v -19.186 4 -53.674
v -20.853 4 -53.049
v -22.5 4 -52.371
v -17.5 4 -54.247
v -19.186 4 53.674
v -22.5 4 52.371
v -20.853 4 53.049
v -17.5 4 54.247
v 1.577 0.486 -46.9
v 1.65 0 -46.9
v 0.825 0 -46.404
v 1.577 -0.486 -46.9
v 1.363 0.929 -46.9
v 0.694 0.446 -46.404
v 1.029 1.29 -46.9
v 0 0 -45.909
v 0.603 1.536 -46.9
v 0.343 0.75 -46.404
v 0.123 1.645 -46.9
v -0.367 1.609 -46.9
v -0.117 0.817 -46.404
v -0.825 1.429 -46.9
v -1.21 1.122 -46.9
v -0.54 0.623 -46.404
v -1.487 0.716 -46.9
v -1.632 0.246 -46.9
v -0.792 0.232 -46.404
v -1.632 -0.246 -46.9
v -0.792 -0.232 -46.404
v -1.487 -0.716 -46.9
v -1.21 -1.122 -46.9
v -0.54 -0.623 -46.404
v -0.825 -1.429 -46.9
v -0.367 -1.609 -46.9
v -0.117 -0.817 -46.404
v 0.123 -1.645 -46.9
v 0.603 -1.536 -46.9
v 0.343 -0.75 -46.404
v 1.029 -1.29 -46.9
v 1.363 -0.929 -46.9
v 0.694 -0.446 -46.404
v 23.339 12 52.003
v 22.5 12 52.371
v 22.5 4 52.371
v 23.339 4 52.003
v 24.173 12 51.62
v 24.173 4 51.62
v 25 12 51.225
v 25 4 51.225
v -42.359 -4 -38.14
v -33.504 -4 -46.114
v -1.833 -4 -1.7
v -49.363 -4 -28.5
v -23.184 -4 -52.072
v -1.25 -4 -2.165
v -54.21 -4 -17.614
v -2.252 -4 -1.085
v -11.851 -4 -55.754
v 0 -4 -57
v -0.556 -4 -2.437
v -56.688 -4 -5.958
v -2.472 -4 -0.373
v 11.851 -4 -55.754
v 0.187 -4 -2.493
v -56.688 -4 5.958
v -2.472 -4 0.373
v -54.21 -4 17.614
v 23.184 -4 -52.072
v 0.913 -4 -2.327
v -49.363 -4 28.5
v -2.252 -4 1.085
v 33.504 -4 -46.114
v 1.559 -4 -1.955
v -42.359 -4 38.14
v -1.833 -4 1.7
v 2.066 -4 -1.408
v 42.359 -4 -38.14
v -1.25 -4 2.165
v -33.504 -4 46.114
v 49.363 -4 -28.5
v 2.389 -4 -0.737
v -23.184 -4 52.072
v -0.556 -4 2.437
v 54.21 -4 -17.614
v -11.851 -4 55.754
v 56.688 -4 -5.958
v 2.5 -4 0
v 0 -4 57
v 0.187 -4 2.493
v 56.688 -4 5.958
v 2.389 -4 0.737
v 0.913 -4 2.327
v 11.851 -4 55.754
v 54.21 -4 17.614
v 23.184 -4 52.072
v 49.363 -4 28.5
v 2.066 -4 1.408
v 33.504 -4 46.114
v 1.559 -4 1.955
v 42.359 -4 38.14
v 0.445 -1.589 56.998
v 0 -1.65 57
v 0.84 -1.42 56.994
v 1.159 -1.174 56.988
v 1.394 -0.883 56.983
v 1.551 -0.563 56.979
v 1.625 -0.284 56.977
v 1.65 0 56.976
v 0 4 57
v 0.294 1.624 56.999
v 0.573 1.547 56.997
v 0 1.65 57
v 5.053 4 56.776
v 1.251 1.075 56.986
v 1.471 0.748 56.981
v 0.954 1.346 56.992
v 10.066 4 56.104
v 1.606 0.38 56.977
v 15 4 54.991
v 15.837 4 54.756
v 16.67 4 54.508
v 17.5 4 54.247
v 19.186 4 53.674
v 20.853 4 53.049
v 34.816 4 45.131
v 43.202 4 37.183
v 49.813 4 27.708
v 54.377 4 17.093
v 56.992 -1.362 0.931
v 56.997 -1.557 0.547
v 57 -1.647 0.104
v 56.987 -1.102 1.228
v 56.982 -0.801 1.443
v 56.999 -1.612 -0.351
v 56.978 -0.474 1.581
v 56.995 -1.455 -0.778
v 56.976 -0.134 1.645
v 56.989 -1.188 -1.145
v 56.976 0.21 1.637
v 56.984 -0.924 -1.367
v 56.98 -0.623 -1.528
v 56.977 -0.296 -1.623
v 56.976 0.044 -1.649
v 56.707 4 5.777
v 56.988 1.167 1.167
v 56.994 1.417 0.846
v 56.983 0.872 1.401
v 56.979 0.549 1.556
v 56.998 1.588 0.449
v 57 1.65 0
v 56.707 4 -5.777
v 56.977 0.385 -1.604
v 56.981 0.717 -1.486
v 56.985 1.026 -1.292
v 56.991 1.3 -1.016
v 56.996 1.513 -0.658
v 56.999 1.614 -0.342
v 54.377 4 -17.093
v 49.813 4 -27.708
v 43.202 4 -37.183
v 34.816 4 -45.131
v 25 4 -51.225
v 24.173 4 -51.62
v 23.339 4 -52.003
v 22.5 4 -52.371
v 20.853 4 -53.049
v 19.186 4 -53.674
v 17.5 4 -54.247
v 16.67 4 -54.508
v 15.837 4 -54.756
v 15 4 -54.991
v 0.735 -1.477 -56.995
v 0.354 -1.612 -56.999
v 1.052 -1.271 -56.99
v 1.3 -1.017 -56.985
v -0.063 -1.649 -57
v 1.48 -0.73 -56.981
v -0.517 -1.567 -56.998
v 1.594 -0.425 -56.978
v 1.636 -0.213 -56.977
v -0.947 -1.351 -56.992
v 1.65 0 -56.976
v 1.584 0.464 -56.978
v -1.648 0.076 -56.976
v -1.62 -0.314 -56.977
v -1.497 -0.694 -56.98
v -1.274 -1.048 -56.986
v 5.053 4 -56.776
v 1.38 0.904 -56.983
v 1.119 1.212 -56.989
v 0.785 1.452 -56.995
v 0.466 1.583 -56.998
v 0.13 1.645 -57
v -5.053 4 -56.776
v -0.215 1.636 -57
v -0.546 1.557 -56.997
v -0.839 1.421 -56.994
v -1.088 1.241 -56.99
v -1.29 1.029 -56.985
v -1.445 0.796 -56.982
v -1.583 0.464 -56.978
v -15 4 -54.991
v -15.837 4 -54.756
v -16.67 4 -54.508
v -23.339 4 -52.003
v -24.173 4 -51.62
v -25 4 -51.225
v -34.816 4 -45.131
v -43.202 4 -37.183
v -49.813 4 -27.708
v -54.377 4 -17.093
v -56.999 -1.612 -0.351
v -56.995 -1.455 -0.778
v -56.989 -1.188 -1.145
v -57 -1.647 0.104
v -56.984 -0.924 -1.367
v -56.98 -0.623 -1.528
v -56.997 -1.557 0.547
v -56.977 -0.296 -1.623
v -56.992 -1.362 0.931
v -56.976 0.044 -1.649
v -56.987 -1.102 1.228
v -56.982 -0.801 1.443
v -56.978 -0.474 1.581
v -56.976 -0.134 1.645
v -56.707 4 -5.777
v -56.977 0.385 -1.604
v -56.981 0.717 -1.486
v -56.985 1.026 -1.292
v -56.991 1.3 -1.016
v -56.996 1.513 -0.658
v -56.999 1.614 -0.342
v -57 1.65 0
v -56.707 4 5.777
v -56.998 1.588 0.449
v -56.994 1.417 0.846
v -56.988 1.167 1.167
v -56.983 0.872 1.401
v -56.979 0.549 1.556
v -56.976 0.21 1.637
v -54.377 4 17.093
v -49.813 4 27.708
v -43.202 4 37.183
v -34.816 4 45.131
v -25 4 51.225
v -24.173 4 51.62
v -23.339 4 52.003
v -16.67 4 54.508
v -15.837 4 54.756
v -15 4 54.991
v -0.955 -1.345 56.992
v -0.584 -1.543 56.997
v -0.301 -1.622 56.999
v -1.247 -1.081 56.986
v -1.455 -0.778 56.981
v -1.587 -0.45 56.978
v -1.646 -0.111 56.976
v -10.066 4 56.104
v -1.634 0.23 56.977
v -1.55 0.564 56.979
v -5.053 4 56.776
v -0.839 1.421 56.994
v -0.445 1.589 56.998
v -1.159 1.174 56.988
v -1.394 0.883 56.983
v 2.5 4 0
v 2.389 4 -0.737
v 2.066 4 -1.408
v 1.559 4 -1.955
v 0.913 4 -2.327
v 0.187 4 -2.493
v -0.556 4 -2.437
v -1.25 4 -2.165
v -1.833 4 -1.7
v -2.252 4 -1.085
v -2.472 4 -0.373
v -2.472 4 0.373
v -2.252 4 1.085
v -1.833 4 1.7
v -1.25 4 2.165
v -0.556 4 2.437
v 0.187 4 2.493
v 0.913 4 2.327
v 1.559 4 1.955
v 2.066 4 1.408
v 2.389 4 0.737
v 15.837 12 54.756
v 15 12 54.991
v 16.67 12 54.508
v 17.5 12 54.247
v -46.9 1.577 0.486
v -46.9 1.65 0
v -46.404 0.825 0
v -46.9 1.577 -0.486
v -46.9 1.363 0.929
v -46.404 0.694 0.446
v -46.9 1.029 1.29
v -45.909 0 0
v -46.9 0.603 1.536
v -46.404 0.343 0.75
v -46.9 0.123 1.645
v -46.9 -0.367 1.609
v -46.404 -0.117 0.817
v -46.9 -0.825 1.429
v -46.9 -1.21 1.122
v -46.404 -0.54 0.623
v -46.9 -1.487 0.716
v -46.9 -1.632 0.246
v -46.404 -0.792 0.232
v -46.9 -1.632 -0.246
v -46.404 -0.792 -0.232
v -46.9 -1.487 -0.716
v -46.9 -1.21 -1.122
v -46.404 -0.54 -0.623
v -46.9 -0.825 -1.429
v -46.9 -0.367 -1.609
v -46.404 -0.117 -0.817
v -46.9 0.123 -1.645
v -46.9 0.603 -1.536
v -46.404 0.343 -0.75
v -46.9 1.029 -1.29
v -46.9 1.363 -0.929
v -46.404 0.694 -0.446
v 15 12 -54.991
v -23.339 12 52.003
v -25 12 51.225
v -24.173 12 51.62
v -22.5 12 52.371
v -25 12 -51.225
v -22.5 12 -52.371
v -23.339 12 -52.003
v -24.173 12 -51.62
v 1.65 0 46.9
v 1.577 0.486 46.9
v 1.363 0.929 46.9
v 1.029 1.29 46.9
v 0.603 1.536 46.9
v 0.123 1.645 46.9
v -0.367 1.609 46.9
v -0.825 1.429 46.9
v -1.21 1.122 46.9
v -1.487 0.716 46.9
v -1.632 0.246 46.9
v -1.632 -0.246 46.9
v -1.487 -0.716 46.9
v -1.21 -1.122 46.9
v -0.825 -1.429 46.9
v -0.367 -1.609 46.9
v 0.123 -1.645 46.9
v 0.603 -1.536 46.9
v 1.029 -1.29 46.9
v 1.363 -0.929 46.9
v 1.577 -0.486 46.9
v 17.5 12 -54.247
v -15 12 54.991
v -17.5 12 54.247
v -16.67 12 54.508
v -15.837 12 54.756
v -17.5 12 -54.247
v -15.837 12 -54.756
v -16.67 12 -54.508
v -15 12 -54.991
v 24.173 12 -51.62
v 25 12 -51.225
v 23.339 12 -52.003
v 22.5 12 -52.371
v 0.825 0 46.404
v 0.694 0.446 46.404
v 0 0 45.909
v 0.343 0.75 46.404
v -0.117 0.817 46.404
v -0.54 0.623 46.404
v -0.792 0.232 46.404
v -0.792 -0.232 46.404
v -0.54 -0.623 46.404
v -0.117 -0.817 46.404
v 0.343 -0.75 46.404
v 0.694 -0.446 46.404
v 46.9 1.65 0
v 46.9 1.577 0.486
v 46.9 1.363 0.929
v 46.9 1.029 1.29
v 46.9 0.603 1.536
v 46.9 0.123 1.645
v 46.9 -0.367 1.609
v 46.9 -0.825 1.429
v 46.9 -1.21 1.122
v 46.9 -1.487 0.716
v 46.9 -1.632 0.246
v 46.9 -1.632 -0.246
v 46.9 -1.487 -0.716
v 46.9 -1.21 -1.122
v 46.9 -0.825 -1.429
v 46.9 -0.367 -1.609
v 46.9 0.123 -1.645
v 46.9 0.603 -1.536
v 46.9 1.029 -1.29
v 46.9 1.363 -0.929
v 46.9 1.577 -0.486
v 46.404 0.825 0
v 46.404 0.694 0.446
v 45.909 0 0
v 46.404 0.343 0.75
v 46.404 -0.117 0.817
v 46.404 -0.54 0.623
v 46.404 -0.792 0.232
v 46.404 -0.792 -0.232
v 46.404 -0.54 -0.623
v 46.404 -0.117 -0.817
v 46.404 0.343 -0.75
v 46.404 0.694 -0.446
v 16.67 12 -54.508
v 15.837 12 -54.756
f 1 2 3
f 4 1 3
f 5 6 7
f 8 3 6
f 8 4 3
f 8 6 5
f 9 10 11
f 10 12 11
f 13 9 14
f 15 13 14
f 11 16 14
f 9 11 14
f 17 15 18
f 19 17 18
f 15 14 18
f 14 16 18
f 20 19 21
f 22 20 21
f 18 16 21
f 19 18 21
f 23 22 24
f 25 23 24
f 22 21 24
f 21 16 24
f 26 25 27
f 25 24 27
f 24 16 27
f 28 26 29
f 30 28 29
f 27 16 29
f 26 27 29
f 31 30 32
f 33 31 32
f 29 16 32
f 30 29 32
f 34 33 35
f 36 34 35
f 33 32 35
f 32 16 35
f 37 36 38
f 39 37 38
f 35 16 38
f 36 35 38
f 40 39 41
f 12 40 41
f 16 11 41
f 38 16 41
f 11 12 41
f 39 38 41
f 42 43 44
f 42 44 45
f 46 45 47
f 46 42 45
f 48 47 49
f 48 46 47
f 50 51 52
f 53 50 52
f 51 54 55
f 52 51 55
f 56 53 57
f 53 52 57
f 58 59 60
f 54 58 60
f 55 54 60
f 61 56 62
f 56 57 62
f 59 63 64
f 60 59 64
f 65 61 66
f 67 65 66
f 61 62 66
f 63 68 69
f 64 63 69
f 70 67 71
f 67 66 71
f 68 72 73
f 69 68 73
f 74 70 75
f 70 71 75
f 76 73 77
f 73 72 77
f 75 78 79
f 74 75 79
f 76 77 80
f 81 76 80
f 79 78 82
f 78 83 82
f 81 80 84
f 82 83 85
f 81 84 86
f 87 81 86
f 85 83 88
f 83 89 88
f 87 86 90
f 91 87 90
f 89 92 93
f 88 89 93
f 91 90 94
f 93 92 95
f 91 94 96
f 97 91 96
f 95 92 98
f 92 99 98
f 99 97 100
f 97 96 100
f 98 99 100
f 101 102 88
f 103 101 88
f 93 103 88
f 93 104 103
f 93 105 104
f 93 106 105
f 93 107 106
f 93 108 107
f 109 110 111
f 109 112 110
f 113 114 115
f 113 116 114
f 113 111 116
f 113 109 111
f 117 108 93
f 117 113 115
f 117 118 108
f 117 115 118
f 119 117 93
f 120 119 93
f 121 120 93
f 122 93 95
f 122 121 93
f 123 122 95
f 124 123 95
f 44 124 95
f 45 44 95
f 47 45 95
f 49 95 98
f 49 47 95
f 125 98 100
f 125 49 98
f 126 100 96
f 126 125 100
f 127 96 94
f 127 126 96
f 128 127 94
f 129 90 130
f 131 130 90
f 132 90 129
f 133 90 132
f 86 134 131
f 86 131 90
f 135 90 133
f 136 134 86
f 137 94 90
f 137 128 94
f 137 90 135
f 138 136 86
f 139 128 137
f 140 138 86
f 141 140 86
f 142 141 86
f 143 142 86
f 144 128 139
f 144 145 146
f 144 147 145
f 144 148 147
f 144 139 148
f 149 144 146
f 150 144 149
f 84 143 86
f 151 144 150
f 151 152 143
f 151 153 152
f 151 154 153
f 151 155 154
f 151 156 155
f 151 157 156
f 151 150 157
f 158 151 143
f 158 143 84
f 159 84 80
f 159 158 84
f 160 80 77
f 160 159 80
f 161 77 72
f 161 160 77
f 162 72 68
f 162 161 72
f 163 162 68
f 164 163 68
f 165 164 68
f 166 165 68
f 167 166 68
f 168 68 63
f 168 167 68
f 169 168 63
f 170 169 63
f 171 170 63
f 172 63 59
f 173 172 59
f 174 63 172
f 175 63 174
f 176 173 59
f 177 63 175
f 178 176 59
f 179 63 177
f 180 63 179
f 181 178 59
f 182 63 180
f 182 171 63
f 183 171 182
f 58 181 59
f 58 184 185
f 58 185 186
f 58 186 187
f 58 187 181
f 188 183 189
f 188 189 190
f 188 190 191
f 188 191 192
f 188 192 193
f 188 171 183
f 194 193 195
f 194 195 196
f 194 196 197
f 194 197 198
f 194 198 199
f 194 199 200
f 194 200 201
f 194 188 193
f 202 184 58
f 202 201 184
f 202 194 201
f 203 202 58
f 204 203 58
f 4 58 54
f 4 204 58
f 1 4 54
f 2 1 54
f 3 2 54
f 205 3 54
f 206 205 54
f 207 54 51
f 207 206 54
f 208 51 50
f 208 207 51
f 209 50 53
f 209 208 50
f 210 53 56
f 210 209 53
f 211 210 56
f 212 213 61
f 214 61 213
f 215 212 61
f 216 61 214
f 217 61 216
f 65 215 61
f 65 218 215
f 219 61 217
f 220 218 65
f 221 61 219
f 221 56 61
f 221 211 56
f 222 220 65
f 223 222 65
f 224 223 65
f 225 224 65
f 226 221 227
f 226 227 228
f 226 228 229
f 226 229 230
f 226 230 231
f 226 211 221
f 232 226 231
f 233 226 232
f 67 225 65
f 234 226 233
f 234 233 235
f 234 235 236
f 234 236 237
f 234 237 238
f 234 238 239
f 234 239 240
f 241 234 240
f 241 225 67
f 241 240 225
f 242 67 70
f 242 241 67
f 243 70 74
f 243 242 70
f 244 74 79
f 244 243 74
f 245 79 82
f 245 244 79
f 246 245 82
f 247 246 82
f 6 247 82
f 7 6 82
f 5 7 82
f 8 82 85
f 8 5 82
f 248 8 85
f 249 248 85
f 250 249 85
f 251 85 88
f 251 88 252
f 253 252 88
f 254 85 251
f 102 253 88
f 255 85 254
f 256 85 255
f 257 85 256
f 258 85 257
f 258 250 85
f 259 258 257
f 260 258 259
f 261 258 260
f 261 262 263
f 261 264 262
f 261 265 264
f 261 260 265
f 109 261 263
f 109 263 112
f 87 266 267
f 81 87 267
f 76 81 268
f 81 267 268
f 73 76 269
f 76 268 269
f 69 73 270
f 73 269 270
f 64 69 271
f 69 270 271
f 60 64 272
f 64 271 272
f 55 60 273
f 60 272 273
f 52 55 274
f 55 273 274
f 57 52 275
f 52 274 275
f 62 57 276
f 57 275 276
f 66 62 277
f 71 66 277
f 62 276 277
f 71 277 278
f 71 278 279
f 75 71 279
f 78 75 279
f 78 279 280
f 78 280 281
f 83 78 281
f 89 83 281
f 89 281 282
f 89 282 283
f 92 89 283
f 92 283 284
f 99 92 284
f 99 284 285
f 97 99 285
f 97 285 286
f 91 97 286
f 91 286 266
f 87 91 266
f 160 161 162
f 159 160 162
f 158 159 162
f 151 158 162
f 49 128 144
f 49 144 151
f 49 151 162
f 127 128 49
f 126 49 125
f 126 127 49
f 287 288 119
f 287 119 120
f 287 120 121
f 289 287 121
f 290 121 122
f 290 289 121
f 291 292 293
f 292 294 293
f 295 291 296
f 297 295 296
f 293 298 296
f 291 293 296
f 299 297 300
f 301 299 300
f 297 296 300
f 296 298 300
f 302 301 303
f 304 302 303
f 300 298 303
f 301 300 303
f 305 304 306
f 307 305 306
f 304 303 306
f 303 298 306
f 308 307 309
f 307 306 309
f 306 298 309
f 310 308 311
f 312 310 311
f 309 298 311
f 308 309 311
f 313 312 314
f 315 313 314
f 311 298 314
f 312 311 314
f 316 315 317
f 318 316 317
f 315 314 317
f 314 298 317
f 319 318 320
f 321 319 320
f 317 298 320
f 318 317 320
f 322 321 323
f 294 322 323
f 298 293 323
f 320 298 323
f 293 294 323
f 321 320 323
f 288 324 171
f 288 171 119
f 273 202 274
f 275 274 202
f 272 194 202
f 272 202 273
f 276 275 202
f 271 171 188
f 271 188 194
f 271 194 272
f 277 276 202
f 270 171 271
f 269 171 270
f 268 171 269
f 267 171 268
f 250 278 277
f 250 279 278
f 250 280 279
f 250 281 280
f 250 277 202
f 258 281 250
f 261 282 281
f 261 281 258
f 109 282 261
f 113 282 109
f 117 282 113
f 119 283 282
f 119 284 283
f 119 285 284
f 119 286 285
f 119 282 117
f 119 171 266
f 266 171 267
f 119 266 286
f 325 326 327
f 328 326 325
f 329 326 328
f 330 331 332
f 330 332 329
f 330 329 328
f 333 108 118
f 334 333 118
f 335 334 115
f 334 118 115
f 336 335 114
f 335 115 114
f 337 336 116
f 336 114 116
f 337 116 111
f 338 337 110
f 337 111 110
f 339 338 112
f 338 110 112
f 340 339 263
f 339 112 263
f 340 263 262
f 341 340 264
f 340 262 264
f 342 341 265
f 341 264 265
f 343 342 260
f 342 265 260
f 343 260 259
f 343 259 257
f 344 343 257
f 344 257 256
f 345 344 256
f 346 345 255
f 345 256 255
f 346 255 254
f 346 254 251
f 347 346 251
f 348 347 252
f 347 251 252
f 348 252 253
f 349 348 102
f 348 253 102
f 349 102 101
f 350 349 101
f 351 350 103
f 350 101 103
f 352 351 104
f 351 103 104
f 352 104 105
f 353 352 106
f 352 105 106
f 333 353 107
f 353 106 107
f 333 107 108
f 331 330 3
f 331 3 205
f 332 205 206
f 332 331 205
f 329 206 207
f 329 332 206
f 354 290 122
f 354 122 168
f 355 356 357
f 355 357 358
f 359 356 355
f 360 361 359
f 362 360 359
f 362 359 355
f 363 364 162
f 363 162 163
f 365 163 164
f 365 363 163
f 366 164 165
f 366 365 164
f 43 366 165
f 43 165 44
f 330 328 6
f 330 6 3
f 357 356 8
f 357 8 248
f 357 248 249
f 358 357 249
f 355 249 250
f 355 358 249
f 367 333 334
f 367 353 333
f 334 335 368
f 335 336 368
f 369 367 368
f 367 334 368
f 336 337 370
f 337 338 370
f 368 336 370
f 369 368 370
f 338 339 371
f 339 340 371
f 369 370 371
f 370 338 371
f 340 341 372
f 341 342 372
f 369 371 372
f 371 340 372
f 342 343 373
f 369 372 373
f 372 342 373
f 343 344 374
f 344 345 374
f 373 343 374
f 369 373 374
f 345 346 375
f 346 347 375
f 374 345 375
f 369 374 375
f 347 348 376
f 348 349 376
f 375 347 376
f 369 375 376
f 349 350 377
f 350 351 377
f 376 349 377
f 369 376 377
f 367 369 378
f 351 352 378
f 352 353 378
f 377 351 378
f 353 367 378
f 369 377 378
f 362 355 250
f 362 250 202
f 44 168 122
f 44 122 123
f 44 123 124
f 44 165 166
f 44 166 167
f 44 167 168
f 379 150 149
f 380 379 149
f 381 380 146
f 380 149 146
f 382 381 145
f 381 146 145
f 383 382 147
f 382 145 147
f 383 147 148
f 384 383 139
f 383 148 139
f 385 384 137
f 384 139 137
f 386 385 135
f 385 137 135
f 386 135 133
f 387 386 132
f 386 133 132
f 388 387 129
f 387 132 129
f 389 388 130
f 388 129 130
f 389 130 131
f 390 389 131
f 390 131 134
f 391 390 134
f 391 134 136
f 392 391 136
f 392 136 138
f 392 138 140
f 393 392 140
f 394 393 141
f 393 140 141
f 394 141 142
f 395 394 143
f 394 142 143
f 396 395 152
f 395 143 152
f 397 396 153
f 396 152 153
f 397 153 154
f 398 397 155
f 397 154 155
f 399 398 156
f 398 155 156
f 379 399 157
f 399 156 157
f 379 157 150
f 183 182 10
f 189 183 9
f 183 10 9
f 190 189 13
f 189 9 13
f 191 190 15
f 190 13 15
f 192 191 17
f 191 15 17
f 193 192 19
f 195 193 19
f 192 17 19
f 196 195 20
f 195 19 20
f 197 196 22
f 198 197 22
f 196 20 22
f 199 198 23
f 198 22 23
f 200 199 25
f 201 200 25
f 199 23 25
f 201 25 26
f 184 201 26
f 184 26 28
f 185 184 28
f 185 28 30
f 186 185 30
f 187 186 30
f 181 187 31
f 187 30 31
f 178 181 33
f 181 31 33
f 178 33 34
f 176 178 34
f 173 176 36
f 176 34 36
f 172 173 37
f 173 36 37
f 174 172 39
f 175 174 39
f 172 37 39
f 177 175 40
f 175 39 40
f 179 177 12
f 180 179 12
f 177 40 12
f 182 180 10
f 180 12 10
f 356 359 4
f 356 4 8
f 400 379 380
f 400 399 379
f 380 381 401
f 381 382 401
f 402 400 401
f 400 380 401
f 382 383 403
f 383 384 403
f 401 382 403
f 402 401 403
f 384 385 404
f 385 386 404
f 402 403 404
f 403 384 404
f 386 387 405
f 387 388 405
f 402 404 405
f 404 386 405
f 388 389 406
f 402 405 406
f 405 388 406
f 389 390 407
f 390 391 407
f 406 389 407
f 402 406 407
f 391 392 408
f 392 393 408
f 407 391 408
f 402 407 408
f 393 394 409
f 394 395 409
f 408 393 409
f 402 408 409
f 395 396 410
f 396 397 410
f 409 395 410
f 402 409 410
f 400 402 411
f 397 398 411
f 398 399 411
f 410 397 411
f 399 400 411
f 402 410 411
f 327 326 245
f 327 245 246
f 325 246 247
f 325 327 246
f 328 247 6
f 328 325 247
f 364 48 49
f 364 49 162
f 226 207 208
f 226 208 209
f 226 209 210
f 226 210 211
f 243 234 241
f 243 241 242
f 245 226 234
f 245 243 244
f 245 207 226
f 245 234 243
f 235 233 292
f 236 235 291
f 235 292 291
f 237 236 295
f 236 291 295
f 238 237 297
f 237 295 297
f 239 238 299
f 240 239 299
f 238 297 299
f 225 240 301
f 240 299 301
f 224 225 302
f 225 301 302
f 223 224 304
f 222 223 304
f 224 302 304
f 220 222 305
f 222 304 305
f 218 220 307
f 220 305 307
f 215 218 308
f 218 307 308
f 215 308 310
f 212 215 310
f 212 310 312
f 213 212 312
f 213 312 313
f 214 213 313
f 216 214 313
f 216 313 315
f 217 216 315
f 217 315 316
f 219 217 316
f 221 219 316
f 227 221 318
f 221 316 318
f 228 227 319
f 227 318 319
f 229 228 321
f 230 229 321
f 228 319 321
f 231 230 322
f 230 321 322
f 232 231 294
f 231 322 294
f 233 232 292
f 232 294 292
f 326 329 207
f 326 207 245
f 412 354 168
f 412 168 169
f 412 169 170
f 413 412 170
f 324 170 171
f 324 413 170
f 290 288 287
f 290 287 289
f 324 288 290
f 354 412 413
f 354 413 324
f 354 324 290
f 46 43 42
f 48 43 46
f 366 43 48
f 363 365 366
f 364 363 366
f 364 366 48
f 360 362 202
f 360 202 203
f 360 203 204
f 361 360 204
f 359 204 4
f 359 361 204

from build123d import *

# Parameters (mm, degrees)
SKETCH1_R           = 57
BOSS_EXTRUDE1_DEPTH = 4
BOSS_EXTRUDE2_START = 8
BOSS_EXTRUDE2_DEPTH = 8
M6_TAPPED_HOLE1_D   = 5


# Read off the part's stored shape, not the designer's step: M4 Tapped Hole1
with BuildPart() as part:
    # Sketch1 → Boss-Extrude1 (new, symmetric)
    with BuildSketch(Plane(origin=(0, 0, 0), x_dir=(1, 0, 0), z_dir=(0, 1, 0))):
        with Locations(Location((0, 0, 0), (0, 0, 270))):
            Circle(SKETCH1_R)
    extrude(amount=BOSS_EXTRUDE1_DEPTH, both=True)

    # Sketch2 → Boss-Extrude2 (add)
    with BuildSketch(Plane(origin=(0, 4, 0), x_dir=(1, 0, 0), z_dir=(0, 1, 0)).offset(BOSS_EXTRUDE2_START)):
        with BuildLine():
            Line((-22.5, -52.37127075), (-22.5, 52.37127075))
            ThreePointArc((-22.5, 52.37127075), (-23.756914523, 51.81321272), (-25, 51.224993899))
            Line((-25, 51.224993899), (-25, -51.224993899))
            ThreePointArc((-25, -51.224993899), (-23.756914523, -51.81321272), (-22.5, -52.37127075))
        make_face()
        with BuildLine():
            ThreePointArc((-15, 54.990908339), (-16.254254993, 54.633315794), (-17.5, 54.247119739))
            Line((-17.5, 54.247119739), (-17.5, -54.247119739))
            ThreePointArc((-17.5, -54.247119739), (-16.254254993, -54.633315794), (-15, -54.990908339))
            Line((-15, -54.990908339), (-15, 54.990908339))
        make_face()
        with BuildLine():
            Line((25, -51.224993899), (25, 51.224993899))
            ThreePointArc((25, 51.224993899), (23.756914523, 51.81321272), (22.5, 52.37127075))
            Line((22.5, 52.37127075), (22.5, -52.37127075))
            ThreePointArc((22.5, -52.37127075), (23.756914523, -51.81321272), (25, -51.224993899))
        make_face()
        with BuildLine():
            ThreePointArc((17.5, 54.247119739), (16.254254993, 54.633315794), (15, 54.990908339))
            Line((15, 54.990908339), (15, -54.990908339))
            ThreePointArc((15, -54.990908339), (16.254254993, -54.633315794), (17.5, -54.247119739))
            Line((17.5, -54.247119739), (17.5, 54.247119739))
        make_face()
    extrude(amount=-BOSS_EXTRUDE2_DEPTH)

    # M6 Tapped Hole1 (through all)
    with Locations(Plane(origin=(0, -4, 0), x_dir=(-1, 0, 0), z_dir=(0, -1, 0))):
        with Locations((0, 0)):
            Hole(M6_TAPPED_HOLE1_D / 2)

    # M4 Tapped Hole1 outline → M4 Tapped Hole1 (revolve, cut)
    with BuildSketch(Plane.XZ):
        Polygon((1.65, -57.000012834), (1.65, -46.9), (0, -45.908579979), (0, -57.000012834), align=None)
        Polygon((0, 57.000003302), (0, 45.908579979), (1.65, 46.9), (1.65, 57.000003302), align=None)
    revolve(axis=Axis((0, 0, 0), (0, 0, 1)), mode=Mode.SUBTRACT)

    # M4 Tapped Hole1 2 outline → M4 Tapped Hole1 2 (revolve, cut)
    with BuildSketch(Plane.YX):
        Polygon((0, 45.908579979), (1.65, 46.9), (1.65, 57.000003302), (0, 57.000003302), align=None)
        Polygon((1.65, -46.9), (0, -45.908579979), (0, -57.000003302), (1.65, -57.000003302), align=None)
    revolve(axis=Axis((0, 0, 0), (1, 0, 0)), mode=Mode.SUBTRACT)


solid = part.part
